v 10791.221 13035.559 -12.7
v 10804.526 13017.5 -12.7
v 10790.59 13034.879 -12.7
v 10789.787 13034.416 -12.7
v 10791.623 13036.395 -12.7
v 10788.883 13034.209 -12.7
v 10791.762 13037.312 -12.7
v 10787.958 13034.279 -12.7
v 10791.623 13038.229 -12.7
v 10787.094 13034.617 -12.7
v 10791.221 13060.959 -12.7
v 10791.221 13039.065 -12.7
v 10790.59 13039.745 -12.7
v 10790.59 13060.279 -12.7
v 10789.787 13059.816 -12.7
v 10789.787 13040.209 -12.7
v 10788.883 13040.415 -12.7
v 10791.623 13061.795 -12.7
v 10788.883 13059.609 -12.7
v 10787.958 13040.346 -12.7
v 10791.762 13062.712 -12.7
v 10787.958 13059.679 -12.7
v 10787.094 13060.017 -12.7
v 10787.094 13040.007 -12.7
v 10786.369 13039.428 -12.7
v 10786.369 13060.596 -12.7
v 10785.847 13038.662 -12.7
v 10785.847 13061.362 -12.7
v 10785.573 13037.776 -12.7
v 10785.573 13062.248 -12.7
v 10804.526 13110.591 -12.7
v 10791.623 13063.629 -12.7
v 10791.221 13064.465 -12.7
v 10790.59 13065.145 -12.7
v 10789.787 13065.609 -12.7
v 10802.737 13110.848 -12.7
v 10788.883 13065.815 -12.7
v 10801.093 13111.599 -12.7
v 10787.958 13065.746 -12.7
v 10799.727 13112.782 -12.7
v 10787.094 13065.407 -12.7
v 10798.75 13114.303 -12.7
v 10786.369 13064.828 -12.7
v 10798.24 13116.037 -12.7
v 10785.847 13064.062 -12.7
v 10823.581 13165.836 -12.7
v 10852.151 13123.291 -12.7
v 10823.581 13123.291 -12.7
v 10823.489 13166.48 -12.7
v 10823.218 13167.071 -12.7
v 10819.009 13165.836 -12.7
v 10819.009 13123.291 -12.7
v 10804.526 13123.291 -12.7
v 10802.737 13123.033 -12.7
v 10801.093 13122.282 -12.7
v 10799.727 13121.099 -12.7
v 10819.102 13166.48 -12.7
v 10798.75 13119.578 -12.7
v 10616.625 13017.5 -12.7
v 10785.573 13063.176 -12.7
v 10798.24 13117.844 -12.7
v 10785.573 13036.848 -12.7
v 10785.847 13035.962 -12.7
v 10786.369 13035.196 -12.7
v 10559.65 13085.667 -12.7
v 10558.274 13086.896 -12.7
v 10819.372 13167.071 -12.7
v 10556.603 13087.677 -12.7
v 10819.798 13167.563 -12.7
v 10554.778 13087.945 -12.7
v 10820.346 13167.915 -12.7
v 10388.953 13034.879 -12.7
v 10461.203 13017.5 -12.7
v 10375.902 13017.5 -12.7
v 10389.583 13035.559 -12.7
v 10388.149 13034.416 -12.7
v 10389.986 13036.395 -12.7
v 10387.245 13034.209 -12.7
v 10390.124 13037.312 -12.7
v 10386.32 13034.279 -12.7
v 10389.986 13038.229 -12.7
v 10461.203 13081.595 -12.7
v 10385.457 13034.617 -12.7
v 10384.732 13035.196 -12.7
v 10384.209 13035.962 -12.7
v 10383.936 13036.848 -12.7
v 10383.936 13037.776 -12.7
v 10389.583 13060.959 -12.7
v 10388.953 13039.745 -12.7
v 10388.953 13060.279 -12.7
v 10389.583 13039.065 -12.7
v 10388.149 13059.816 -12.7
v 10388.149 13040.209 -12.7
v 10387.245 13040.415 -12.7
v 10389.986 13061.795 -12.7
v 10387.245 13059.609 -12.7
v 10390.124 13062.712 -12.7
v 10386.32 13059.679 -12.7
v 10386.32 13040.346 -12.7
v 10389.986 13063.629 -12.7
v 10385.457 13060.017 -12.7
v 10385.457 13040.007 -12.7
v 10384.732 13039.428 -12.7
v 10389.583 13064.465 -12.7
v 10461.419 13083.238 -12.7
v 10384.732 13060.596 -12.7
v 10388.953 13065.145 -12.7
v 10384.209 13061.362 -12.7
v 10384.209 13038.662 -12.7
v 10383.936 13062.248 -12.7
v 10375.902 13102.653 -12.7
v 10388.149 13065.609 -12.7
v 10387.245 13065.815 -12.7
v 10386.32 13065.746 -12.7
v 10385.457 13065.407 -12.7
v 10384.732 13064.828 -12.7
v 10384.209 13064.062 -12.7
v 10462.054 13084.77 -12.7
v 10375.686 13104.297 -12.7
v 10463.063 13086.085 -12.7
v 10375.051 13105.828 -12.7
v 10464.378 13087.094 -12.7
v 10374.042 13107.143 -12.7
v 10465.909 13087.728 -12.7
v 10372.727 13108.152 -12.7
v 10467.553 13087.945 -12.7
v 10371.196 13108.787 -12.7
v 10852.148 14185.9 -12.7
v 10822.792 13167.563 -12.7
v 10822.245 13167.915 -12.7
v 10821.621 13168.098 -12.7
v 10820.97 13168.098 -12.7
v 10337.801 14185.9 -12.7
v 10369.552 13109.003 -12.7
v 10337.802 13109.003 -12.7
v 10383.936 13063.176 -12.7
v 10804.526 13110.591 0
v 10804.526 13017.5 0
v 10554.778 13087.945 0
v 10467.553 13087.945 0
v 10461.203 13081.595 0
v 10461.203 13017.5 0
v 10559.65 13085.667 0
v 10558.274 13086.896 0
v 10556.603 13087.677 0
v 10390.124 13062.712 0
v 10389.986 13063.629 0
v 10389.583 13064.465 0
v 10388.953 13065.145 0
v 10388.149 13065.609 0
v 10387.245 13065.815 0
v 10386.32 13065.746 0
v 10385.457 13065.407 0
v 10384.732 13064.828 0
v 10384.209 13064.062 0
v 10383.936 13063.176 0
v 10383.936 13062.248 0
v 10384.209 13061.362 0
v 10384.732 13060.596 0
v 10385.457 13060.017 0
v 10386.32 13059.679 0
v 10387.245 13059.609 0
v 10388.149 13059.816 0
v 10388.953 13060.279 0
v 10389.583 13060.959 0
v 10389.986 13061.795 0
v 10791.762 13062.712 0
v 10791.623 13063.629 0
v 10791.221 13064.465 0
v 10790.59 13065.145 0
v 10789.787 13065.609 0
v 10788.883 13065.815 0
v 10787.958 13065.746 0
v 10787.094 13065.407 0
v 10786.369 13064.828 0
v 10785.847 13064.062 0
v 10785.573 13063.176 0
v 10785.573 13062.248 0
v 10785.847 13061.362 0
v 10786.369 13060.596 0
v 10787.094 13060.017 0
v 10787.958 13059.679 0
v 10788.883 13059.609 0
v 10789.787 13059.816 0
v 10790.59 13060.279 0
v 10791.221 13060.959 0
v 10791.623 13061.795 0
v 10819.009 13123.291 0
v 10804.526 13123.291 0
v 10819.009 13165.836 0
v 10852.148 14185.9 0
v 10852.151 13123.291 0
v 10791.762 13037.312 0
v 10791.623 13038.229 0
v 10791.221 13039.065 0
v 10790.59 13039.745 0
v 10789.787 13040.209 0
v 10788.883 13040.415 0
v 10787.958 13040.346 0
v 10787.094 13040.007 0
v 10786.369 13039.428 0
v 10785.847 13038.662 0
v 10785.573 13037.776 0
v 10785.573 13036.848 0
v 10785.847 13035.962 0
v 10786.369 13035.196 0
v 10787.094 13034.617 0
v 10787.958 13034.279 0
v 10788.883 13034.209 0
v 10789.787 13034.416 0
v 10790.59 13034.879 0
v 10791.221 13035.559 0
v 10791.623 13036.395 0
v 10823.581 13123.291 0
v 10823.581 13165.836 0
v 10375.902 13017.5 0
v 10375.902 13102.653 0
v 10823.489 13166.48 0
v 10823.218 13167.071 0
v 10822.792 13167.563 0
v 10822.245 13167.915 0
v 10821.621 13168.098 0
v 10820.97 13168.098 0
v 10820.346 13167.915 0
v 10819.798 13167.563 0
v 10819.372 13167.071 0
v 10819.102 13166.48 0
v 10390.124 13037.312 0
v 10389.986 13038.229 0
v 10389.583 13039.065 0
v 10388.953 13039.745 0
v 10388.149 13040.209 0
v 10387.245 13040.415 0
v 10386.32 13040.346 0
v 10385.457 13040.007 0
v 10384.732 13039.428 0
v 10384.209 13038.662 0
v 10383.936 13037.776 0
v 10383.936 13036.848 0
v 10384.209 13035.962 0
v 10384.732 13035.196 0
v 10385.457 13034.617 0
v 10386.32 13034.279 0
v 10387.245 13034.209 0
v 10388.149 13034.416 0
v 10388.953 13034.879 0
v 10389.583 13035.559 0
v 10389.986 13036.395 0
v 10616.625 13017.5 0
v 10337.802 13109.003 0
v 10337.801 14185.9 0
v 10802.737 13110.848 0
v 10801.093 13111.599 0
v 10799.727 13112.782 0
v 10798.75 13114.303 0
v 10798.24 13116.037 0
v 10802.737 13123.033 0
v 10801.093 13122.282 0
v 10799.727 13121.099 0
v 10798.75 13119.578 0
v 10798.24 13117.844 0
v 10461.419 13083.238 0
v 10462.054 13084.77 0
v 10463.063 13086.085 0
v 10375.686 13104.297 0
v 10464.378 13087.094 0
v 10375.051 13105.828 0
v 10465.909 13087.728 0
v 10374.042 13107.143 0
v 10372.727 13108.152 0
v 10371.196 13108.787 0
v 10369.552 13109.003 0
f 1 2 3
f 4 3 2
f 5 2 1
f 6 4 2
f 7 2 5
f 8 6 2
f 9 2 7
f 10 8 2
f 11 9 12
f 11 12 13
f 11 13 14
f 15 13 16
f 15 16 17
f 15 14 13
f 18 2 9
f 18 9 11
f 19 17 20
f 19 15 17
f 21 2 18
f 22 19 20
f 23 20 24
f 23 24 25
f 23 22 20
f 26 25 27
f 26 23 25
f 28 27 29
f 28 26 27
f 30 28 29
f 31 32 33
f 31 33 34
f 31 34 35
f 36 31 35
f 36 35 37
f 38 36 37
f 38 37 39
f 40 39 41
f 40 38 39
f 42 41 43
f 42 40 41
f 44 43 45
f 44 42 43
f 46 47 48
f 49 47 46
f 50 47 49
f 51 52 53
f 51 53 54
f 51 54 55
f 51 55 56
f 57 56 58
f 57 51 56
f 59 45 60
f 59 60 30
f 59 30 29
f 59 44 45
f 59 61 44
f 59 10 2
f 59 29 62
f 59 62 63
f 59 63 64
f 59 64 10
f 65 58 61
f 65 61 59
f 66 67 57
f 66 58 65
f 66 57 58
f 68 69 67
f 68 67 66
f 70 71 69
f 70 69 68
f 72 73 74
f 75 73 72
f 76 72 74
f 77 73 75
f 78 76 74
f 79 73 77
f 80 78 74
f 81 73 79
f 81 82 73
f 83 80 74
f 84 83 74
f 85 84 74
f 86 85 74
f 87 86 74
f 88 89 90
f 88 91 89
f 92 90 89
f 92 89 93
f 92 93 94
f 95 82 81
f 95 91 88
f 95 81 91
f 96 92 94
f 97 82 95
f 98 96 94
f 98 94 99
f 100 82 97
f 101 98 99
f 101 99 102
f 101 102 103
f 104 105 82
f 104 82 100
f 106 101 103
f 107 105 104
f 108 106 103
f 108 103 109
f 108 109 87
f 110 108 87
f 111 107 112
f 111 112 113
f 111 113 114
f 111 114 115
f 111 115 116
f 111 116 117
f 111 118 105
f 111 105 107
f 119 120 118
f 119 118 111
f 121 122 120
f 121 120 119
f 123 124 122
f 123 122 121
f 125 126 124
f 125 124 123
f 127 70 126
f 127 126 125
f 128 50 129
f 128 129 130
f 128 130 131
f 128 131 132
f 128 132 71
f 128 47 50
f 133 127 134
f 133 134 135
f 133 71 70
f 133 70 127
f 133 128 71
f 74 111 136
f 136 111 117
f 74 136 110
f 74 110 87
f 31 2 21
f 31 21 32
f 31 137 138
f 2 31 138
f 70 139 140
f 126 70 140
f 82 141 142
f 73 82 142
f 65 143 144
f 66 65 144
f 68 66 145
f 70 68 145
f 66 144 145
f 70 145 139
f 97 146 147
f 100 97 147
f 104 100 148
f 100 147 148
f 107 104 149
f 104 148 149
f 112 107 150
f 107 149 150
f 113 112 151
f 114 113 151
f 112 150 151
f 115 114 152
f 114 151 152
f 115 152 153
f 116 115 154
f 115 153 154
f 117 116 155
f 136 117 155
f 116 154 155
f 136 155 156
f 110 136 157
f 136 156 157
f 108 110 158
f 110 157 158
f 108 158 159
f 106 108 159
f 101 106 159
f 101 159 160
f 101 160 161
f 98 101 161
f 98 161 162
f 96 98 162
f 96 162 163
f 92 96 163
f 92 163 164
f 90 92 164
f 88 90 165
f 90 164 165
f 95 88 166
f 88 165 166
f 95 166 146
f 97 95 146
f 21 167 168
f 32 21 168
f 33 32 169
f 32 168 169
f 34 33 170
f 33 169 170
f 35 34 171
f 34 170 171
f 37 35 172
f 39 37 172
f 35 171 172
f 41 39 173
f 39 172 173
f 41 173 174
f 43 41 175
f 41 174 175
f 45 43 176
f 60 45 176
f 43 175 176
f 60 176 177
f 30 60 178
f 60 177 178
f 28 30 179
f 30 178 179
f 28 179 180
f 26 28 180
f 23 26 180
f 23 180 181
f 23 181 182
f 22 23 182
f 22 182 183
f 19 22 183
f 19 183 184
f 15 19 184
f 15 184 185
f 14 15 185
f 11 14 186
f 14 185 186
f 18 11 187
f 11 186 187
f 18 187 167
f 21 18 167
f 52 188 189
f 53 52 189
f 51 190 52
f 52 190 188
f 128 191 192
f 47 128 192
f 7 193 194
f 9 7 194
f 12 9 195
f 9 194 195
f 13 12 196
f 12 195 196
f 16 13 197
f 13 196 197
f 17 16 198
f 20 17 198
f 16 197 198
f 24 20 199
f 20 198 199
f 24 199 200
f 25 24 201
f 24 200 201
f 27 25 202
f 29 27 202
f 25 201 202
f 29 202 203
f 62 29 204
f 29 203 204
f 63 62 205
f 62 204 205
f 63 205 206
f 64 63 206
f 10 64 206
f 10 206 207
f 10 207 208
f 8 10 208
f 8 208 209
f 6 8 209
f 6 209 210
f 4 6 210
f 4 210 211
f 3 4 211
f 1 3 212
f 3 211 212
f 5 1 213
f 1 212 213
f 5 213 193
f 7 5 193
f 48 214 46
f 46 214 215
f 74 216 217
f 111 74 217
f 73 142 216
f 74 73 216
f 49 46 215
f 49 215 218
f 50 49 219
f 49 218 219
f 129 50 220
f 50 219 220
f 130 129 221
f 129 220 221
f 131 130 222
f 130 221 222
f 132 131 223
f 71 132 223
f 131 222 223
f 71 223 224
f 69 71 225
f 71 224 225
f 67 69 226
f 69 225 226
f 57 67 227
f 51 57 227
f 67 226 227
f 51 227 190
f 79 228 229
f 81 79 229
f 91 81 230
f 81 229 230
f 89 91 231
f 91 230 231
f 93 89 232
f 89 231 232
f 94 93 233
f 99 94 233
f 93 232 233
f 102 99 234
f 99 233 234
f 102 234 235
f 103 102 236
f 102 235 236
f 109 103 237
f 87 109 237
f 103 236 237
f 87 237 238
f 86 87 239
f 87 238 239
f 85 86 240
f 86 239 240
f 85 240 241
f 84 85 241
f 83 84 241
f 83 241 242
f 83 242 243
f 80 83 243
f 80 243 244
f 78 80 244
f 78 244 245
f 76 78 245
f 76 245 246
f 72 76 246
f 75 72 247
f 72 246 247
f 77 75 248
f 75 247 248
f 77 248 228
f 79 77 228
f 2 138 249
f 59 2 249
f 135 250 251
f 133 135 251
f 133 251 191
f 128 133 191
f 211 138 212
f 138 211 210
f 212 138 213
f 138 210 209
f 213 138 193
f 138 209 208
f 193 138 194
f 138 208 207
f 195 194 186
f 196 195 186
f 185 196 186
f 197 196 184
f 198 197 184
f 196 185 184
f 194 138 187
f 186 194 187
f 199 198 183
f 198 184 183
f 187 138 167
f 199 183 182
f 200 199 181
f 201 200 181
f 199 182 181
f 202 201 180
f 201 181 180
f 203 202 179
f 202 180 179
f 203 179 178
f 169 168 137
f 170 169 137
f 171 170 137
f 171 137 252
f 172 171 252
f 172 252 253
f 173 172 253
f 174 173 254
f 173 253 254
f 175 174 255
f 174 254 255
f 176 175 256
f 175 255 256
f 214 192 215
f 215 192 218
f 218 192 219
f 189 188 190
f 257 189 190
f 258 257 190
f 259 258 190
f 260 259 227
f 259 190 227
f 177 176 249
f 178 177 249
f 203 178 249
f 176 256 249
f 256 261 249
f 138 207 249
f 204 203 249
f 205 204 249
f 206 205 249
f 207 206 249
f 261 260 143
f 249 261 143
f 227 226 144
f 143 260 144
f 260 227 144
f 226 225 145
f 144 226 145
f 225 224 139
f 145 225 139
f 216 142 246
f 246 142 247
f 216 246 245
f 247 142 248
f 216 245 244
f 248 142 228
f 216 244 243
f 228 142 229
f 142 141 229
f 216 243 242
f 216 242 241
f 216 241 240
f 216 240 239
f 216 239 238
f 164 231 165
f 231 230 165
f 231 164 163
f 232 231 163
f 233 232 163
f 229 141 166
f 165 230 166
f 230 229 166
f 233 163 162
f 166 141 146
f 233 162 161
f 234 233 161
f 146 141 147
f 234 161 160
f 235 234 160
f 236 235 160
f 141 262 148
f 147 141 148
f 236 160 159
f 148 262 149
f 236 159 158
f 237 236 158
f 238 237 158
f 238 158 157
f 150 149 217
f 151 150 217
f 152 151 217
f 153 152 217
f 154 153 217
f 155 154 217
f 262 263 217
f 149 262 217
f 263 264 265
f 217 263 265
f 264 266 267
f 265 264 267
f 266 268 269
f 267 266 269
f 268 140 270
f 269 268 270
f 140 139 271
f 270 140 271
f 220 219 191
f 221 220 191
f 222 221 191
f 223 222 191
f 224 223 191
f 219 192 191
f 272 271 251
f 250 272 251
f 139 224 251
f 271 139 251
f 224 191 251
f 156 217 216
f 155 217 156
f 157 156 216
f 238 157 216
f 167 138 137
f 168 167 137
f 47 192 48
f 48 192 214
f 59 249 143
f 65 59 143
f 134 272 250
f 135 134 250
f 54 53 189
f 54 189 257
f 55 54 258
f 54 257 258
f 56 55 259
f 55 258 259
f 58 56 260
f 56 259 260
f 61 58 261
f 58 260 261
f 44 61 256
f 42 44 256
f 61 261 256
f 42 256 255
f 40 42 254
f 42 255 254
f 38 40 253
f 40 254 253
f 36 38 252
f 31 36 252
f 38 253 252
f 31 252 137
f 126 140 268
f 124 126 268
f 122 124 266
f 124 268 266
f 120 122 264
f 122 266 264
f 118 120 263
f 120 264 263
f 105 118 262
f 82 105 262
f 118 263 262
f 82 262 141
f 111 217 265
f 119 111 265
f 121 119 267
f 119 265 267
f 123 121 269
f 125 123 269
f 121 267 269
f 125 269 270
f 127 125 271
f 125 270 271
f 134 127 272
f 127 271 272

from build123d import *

# Parameters (mm, degrees)
EXTRUDE1_DEPTH     = 12.7
SKETCH3_R          = 3.1115
CUT_EXTRUDE1_DEPTH = 12.7


with BuildPart() as part:
    # Sketch2 → Extrude1 (new body)
    with BuildSketch(Plane.XY):
        with BuildLine():
            Line((10375.902142089, 13017.500110193), (10375.902142089, 13102.653009206))
            ThreePointArc((10375.902142089, 13102.653009206), (10374.042270149, 13107.143137266), (10369.552142089, 13109.003009206))
            Line((10369.552142089, 13109.003009206), (10337.802142089, 13109.003009206))
            Line((10337.802142089, 13109.003009206), (10337.800747814, 14185.900110193))
            Line((10337.800747814, 14185.900110193), (10852.147924282, 14185.900110193))
            Line((10852.147924282, 14185.900110193), (10852.150747814, 13123.290509206))
            Line((10852.150747814, 13123.290509206), (10823.581236416, 13123.290509206))
            Line((10823.581236416, 13123.290509206), (10823.581236416, 13165.835509206))
            ThreePointArc((10823.581236416, 13165.835509206), (10821.295236416, 13168.121509206), (10819.009236416, 13165.835509206))
            Line((10819.009236416, 13165.835509206), (10819.009236416, 13123.290509206))
            Line((10819.009236416, 13123.290509206), (10804.525747814, 13123.290509206))
            ThreePointArc((10804.525747814, 13123.290509206), (10798.175747814, 13116.940509206), (10804.525747814, 13110.590509206))
            Line((10804.525747814, 13110.590509206), (10804.525747814, 13017.500110193))
            Line((10804.525747814, 13017.500110193), (10616.625223517, 13017.500110193))
            Line((10616.625223517, 13017.500110193), (10559.649893716, 13085.667043341))
            ThreePointArc((10559.649893716, 13085.667043341), (10557.466824452, 13087.347190416), (10554.77765388, 13087.944724716))
            Line((10554.77765388, 13087.944724716), (10467.552782059, 13087.944724716))
            ThreePointArc((10467.552782059, 13087.944724716), (10463.062653998, 13086.084852777), (10461.202782059, 13081.594724716))
            Line((10461.202782059, 13081.594724716), (10461.202782059, 13017.500110193))
            Line((10461.202782059, 13017.500110193), (10375.902142089, 13017.500110193))
        make_face()
    extrude(amount=-EXTRUDE1_DEPTH)

    # Sketch3 → Cut-Extrude1 (cut)
    with BuildSketch(Plane.XY):
        with Locations((10387.012550678, 13062.712110193)):
            Circle(SKETCH3_R)
        with Locations((10387.012550678, 13037.312110193)):
            Circle(SKETCH3_R)
        with Locations((10788.650050678, 13062.712110193)):
            Circle(SKETCH3_R)
        with Locations((10788.650050678, 13037.312110193)):
            Circle(SKETCH3_R)
    extrude(amount=-CUT_EXTRUDE1_DEPTH, mode=Mode.SUBTRACT)


solid = part.part
